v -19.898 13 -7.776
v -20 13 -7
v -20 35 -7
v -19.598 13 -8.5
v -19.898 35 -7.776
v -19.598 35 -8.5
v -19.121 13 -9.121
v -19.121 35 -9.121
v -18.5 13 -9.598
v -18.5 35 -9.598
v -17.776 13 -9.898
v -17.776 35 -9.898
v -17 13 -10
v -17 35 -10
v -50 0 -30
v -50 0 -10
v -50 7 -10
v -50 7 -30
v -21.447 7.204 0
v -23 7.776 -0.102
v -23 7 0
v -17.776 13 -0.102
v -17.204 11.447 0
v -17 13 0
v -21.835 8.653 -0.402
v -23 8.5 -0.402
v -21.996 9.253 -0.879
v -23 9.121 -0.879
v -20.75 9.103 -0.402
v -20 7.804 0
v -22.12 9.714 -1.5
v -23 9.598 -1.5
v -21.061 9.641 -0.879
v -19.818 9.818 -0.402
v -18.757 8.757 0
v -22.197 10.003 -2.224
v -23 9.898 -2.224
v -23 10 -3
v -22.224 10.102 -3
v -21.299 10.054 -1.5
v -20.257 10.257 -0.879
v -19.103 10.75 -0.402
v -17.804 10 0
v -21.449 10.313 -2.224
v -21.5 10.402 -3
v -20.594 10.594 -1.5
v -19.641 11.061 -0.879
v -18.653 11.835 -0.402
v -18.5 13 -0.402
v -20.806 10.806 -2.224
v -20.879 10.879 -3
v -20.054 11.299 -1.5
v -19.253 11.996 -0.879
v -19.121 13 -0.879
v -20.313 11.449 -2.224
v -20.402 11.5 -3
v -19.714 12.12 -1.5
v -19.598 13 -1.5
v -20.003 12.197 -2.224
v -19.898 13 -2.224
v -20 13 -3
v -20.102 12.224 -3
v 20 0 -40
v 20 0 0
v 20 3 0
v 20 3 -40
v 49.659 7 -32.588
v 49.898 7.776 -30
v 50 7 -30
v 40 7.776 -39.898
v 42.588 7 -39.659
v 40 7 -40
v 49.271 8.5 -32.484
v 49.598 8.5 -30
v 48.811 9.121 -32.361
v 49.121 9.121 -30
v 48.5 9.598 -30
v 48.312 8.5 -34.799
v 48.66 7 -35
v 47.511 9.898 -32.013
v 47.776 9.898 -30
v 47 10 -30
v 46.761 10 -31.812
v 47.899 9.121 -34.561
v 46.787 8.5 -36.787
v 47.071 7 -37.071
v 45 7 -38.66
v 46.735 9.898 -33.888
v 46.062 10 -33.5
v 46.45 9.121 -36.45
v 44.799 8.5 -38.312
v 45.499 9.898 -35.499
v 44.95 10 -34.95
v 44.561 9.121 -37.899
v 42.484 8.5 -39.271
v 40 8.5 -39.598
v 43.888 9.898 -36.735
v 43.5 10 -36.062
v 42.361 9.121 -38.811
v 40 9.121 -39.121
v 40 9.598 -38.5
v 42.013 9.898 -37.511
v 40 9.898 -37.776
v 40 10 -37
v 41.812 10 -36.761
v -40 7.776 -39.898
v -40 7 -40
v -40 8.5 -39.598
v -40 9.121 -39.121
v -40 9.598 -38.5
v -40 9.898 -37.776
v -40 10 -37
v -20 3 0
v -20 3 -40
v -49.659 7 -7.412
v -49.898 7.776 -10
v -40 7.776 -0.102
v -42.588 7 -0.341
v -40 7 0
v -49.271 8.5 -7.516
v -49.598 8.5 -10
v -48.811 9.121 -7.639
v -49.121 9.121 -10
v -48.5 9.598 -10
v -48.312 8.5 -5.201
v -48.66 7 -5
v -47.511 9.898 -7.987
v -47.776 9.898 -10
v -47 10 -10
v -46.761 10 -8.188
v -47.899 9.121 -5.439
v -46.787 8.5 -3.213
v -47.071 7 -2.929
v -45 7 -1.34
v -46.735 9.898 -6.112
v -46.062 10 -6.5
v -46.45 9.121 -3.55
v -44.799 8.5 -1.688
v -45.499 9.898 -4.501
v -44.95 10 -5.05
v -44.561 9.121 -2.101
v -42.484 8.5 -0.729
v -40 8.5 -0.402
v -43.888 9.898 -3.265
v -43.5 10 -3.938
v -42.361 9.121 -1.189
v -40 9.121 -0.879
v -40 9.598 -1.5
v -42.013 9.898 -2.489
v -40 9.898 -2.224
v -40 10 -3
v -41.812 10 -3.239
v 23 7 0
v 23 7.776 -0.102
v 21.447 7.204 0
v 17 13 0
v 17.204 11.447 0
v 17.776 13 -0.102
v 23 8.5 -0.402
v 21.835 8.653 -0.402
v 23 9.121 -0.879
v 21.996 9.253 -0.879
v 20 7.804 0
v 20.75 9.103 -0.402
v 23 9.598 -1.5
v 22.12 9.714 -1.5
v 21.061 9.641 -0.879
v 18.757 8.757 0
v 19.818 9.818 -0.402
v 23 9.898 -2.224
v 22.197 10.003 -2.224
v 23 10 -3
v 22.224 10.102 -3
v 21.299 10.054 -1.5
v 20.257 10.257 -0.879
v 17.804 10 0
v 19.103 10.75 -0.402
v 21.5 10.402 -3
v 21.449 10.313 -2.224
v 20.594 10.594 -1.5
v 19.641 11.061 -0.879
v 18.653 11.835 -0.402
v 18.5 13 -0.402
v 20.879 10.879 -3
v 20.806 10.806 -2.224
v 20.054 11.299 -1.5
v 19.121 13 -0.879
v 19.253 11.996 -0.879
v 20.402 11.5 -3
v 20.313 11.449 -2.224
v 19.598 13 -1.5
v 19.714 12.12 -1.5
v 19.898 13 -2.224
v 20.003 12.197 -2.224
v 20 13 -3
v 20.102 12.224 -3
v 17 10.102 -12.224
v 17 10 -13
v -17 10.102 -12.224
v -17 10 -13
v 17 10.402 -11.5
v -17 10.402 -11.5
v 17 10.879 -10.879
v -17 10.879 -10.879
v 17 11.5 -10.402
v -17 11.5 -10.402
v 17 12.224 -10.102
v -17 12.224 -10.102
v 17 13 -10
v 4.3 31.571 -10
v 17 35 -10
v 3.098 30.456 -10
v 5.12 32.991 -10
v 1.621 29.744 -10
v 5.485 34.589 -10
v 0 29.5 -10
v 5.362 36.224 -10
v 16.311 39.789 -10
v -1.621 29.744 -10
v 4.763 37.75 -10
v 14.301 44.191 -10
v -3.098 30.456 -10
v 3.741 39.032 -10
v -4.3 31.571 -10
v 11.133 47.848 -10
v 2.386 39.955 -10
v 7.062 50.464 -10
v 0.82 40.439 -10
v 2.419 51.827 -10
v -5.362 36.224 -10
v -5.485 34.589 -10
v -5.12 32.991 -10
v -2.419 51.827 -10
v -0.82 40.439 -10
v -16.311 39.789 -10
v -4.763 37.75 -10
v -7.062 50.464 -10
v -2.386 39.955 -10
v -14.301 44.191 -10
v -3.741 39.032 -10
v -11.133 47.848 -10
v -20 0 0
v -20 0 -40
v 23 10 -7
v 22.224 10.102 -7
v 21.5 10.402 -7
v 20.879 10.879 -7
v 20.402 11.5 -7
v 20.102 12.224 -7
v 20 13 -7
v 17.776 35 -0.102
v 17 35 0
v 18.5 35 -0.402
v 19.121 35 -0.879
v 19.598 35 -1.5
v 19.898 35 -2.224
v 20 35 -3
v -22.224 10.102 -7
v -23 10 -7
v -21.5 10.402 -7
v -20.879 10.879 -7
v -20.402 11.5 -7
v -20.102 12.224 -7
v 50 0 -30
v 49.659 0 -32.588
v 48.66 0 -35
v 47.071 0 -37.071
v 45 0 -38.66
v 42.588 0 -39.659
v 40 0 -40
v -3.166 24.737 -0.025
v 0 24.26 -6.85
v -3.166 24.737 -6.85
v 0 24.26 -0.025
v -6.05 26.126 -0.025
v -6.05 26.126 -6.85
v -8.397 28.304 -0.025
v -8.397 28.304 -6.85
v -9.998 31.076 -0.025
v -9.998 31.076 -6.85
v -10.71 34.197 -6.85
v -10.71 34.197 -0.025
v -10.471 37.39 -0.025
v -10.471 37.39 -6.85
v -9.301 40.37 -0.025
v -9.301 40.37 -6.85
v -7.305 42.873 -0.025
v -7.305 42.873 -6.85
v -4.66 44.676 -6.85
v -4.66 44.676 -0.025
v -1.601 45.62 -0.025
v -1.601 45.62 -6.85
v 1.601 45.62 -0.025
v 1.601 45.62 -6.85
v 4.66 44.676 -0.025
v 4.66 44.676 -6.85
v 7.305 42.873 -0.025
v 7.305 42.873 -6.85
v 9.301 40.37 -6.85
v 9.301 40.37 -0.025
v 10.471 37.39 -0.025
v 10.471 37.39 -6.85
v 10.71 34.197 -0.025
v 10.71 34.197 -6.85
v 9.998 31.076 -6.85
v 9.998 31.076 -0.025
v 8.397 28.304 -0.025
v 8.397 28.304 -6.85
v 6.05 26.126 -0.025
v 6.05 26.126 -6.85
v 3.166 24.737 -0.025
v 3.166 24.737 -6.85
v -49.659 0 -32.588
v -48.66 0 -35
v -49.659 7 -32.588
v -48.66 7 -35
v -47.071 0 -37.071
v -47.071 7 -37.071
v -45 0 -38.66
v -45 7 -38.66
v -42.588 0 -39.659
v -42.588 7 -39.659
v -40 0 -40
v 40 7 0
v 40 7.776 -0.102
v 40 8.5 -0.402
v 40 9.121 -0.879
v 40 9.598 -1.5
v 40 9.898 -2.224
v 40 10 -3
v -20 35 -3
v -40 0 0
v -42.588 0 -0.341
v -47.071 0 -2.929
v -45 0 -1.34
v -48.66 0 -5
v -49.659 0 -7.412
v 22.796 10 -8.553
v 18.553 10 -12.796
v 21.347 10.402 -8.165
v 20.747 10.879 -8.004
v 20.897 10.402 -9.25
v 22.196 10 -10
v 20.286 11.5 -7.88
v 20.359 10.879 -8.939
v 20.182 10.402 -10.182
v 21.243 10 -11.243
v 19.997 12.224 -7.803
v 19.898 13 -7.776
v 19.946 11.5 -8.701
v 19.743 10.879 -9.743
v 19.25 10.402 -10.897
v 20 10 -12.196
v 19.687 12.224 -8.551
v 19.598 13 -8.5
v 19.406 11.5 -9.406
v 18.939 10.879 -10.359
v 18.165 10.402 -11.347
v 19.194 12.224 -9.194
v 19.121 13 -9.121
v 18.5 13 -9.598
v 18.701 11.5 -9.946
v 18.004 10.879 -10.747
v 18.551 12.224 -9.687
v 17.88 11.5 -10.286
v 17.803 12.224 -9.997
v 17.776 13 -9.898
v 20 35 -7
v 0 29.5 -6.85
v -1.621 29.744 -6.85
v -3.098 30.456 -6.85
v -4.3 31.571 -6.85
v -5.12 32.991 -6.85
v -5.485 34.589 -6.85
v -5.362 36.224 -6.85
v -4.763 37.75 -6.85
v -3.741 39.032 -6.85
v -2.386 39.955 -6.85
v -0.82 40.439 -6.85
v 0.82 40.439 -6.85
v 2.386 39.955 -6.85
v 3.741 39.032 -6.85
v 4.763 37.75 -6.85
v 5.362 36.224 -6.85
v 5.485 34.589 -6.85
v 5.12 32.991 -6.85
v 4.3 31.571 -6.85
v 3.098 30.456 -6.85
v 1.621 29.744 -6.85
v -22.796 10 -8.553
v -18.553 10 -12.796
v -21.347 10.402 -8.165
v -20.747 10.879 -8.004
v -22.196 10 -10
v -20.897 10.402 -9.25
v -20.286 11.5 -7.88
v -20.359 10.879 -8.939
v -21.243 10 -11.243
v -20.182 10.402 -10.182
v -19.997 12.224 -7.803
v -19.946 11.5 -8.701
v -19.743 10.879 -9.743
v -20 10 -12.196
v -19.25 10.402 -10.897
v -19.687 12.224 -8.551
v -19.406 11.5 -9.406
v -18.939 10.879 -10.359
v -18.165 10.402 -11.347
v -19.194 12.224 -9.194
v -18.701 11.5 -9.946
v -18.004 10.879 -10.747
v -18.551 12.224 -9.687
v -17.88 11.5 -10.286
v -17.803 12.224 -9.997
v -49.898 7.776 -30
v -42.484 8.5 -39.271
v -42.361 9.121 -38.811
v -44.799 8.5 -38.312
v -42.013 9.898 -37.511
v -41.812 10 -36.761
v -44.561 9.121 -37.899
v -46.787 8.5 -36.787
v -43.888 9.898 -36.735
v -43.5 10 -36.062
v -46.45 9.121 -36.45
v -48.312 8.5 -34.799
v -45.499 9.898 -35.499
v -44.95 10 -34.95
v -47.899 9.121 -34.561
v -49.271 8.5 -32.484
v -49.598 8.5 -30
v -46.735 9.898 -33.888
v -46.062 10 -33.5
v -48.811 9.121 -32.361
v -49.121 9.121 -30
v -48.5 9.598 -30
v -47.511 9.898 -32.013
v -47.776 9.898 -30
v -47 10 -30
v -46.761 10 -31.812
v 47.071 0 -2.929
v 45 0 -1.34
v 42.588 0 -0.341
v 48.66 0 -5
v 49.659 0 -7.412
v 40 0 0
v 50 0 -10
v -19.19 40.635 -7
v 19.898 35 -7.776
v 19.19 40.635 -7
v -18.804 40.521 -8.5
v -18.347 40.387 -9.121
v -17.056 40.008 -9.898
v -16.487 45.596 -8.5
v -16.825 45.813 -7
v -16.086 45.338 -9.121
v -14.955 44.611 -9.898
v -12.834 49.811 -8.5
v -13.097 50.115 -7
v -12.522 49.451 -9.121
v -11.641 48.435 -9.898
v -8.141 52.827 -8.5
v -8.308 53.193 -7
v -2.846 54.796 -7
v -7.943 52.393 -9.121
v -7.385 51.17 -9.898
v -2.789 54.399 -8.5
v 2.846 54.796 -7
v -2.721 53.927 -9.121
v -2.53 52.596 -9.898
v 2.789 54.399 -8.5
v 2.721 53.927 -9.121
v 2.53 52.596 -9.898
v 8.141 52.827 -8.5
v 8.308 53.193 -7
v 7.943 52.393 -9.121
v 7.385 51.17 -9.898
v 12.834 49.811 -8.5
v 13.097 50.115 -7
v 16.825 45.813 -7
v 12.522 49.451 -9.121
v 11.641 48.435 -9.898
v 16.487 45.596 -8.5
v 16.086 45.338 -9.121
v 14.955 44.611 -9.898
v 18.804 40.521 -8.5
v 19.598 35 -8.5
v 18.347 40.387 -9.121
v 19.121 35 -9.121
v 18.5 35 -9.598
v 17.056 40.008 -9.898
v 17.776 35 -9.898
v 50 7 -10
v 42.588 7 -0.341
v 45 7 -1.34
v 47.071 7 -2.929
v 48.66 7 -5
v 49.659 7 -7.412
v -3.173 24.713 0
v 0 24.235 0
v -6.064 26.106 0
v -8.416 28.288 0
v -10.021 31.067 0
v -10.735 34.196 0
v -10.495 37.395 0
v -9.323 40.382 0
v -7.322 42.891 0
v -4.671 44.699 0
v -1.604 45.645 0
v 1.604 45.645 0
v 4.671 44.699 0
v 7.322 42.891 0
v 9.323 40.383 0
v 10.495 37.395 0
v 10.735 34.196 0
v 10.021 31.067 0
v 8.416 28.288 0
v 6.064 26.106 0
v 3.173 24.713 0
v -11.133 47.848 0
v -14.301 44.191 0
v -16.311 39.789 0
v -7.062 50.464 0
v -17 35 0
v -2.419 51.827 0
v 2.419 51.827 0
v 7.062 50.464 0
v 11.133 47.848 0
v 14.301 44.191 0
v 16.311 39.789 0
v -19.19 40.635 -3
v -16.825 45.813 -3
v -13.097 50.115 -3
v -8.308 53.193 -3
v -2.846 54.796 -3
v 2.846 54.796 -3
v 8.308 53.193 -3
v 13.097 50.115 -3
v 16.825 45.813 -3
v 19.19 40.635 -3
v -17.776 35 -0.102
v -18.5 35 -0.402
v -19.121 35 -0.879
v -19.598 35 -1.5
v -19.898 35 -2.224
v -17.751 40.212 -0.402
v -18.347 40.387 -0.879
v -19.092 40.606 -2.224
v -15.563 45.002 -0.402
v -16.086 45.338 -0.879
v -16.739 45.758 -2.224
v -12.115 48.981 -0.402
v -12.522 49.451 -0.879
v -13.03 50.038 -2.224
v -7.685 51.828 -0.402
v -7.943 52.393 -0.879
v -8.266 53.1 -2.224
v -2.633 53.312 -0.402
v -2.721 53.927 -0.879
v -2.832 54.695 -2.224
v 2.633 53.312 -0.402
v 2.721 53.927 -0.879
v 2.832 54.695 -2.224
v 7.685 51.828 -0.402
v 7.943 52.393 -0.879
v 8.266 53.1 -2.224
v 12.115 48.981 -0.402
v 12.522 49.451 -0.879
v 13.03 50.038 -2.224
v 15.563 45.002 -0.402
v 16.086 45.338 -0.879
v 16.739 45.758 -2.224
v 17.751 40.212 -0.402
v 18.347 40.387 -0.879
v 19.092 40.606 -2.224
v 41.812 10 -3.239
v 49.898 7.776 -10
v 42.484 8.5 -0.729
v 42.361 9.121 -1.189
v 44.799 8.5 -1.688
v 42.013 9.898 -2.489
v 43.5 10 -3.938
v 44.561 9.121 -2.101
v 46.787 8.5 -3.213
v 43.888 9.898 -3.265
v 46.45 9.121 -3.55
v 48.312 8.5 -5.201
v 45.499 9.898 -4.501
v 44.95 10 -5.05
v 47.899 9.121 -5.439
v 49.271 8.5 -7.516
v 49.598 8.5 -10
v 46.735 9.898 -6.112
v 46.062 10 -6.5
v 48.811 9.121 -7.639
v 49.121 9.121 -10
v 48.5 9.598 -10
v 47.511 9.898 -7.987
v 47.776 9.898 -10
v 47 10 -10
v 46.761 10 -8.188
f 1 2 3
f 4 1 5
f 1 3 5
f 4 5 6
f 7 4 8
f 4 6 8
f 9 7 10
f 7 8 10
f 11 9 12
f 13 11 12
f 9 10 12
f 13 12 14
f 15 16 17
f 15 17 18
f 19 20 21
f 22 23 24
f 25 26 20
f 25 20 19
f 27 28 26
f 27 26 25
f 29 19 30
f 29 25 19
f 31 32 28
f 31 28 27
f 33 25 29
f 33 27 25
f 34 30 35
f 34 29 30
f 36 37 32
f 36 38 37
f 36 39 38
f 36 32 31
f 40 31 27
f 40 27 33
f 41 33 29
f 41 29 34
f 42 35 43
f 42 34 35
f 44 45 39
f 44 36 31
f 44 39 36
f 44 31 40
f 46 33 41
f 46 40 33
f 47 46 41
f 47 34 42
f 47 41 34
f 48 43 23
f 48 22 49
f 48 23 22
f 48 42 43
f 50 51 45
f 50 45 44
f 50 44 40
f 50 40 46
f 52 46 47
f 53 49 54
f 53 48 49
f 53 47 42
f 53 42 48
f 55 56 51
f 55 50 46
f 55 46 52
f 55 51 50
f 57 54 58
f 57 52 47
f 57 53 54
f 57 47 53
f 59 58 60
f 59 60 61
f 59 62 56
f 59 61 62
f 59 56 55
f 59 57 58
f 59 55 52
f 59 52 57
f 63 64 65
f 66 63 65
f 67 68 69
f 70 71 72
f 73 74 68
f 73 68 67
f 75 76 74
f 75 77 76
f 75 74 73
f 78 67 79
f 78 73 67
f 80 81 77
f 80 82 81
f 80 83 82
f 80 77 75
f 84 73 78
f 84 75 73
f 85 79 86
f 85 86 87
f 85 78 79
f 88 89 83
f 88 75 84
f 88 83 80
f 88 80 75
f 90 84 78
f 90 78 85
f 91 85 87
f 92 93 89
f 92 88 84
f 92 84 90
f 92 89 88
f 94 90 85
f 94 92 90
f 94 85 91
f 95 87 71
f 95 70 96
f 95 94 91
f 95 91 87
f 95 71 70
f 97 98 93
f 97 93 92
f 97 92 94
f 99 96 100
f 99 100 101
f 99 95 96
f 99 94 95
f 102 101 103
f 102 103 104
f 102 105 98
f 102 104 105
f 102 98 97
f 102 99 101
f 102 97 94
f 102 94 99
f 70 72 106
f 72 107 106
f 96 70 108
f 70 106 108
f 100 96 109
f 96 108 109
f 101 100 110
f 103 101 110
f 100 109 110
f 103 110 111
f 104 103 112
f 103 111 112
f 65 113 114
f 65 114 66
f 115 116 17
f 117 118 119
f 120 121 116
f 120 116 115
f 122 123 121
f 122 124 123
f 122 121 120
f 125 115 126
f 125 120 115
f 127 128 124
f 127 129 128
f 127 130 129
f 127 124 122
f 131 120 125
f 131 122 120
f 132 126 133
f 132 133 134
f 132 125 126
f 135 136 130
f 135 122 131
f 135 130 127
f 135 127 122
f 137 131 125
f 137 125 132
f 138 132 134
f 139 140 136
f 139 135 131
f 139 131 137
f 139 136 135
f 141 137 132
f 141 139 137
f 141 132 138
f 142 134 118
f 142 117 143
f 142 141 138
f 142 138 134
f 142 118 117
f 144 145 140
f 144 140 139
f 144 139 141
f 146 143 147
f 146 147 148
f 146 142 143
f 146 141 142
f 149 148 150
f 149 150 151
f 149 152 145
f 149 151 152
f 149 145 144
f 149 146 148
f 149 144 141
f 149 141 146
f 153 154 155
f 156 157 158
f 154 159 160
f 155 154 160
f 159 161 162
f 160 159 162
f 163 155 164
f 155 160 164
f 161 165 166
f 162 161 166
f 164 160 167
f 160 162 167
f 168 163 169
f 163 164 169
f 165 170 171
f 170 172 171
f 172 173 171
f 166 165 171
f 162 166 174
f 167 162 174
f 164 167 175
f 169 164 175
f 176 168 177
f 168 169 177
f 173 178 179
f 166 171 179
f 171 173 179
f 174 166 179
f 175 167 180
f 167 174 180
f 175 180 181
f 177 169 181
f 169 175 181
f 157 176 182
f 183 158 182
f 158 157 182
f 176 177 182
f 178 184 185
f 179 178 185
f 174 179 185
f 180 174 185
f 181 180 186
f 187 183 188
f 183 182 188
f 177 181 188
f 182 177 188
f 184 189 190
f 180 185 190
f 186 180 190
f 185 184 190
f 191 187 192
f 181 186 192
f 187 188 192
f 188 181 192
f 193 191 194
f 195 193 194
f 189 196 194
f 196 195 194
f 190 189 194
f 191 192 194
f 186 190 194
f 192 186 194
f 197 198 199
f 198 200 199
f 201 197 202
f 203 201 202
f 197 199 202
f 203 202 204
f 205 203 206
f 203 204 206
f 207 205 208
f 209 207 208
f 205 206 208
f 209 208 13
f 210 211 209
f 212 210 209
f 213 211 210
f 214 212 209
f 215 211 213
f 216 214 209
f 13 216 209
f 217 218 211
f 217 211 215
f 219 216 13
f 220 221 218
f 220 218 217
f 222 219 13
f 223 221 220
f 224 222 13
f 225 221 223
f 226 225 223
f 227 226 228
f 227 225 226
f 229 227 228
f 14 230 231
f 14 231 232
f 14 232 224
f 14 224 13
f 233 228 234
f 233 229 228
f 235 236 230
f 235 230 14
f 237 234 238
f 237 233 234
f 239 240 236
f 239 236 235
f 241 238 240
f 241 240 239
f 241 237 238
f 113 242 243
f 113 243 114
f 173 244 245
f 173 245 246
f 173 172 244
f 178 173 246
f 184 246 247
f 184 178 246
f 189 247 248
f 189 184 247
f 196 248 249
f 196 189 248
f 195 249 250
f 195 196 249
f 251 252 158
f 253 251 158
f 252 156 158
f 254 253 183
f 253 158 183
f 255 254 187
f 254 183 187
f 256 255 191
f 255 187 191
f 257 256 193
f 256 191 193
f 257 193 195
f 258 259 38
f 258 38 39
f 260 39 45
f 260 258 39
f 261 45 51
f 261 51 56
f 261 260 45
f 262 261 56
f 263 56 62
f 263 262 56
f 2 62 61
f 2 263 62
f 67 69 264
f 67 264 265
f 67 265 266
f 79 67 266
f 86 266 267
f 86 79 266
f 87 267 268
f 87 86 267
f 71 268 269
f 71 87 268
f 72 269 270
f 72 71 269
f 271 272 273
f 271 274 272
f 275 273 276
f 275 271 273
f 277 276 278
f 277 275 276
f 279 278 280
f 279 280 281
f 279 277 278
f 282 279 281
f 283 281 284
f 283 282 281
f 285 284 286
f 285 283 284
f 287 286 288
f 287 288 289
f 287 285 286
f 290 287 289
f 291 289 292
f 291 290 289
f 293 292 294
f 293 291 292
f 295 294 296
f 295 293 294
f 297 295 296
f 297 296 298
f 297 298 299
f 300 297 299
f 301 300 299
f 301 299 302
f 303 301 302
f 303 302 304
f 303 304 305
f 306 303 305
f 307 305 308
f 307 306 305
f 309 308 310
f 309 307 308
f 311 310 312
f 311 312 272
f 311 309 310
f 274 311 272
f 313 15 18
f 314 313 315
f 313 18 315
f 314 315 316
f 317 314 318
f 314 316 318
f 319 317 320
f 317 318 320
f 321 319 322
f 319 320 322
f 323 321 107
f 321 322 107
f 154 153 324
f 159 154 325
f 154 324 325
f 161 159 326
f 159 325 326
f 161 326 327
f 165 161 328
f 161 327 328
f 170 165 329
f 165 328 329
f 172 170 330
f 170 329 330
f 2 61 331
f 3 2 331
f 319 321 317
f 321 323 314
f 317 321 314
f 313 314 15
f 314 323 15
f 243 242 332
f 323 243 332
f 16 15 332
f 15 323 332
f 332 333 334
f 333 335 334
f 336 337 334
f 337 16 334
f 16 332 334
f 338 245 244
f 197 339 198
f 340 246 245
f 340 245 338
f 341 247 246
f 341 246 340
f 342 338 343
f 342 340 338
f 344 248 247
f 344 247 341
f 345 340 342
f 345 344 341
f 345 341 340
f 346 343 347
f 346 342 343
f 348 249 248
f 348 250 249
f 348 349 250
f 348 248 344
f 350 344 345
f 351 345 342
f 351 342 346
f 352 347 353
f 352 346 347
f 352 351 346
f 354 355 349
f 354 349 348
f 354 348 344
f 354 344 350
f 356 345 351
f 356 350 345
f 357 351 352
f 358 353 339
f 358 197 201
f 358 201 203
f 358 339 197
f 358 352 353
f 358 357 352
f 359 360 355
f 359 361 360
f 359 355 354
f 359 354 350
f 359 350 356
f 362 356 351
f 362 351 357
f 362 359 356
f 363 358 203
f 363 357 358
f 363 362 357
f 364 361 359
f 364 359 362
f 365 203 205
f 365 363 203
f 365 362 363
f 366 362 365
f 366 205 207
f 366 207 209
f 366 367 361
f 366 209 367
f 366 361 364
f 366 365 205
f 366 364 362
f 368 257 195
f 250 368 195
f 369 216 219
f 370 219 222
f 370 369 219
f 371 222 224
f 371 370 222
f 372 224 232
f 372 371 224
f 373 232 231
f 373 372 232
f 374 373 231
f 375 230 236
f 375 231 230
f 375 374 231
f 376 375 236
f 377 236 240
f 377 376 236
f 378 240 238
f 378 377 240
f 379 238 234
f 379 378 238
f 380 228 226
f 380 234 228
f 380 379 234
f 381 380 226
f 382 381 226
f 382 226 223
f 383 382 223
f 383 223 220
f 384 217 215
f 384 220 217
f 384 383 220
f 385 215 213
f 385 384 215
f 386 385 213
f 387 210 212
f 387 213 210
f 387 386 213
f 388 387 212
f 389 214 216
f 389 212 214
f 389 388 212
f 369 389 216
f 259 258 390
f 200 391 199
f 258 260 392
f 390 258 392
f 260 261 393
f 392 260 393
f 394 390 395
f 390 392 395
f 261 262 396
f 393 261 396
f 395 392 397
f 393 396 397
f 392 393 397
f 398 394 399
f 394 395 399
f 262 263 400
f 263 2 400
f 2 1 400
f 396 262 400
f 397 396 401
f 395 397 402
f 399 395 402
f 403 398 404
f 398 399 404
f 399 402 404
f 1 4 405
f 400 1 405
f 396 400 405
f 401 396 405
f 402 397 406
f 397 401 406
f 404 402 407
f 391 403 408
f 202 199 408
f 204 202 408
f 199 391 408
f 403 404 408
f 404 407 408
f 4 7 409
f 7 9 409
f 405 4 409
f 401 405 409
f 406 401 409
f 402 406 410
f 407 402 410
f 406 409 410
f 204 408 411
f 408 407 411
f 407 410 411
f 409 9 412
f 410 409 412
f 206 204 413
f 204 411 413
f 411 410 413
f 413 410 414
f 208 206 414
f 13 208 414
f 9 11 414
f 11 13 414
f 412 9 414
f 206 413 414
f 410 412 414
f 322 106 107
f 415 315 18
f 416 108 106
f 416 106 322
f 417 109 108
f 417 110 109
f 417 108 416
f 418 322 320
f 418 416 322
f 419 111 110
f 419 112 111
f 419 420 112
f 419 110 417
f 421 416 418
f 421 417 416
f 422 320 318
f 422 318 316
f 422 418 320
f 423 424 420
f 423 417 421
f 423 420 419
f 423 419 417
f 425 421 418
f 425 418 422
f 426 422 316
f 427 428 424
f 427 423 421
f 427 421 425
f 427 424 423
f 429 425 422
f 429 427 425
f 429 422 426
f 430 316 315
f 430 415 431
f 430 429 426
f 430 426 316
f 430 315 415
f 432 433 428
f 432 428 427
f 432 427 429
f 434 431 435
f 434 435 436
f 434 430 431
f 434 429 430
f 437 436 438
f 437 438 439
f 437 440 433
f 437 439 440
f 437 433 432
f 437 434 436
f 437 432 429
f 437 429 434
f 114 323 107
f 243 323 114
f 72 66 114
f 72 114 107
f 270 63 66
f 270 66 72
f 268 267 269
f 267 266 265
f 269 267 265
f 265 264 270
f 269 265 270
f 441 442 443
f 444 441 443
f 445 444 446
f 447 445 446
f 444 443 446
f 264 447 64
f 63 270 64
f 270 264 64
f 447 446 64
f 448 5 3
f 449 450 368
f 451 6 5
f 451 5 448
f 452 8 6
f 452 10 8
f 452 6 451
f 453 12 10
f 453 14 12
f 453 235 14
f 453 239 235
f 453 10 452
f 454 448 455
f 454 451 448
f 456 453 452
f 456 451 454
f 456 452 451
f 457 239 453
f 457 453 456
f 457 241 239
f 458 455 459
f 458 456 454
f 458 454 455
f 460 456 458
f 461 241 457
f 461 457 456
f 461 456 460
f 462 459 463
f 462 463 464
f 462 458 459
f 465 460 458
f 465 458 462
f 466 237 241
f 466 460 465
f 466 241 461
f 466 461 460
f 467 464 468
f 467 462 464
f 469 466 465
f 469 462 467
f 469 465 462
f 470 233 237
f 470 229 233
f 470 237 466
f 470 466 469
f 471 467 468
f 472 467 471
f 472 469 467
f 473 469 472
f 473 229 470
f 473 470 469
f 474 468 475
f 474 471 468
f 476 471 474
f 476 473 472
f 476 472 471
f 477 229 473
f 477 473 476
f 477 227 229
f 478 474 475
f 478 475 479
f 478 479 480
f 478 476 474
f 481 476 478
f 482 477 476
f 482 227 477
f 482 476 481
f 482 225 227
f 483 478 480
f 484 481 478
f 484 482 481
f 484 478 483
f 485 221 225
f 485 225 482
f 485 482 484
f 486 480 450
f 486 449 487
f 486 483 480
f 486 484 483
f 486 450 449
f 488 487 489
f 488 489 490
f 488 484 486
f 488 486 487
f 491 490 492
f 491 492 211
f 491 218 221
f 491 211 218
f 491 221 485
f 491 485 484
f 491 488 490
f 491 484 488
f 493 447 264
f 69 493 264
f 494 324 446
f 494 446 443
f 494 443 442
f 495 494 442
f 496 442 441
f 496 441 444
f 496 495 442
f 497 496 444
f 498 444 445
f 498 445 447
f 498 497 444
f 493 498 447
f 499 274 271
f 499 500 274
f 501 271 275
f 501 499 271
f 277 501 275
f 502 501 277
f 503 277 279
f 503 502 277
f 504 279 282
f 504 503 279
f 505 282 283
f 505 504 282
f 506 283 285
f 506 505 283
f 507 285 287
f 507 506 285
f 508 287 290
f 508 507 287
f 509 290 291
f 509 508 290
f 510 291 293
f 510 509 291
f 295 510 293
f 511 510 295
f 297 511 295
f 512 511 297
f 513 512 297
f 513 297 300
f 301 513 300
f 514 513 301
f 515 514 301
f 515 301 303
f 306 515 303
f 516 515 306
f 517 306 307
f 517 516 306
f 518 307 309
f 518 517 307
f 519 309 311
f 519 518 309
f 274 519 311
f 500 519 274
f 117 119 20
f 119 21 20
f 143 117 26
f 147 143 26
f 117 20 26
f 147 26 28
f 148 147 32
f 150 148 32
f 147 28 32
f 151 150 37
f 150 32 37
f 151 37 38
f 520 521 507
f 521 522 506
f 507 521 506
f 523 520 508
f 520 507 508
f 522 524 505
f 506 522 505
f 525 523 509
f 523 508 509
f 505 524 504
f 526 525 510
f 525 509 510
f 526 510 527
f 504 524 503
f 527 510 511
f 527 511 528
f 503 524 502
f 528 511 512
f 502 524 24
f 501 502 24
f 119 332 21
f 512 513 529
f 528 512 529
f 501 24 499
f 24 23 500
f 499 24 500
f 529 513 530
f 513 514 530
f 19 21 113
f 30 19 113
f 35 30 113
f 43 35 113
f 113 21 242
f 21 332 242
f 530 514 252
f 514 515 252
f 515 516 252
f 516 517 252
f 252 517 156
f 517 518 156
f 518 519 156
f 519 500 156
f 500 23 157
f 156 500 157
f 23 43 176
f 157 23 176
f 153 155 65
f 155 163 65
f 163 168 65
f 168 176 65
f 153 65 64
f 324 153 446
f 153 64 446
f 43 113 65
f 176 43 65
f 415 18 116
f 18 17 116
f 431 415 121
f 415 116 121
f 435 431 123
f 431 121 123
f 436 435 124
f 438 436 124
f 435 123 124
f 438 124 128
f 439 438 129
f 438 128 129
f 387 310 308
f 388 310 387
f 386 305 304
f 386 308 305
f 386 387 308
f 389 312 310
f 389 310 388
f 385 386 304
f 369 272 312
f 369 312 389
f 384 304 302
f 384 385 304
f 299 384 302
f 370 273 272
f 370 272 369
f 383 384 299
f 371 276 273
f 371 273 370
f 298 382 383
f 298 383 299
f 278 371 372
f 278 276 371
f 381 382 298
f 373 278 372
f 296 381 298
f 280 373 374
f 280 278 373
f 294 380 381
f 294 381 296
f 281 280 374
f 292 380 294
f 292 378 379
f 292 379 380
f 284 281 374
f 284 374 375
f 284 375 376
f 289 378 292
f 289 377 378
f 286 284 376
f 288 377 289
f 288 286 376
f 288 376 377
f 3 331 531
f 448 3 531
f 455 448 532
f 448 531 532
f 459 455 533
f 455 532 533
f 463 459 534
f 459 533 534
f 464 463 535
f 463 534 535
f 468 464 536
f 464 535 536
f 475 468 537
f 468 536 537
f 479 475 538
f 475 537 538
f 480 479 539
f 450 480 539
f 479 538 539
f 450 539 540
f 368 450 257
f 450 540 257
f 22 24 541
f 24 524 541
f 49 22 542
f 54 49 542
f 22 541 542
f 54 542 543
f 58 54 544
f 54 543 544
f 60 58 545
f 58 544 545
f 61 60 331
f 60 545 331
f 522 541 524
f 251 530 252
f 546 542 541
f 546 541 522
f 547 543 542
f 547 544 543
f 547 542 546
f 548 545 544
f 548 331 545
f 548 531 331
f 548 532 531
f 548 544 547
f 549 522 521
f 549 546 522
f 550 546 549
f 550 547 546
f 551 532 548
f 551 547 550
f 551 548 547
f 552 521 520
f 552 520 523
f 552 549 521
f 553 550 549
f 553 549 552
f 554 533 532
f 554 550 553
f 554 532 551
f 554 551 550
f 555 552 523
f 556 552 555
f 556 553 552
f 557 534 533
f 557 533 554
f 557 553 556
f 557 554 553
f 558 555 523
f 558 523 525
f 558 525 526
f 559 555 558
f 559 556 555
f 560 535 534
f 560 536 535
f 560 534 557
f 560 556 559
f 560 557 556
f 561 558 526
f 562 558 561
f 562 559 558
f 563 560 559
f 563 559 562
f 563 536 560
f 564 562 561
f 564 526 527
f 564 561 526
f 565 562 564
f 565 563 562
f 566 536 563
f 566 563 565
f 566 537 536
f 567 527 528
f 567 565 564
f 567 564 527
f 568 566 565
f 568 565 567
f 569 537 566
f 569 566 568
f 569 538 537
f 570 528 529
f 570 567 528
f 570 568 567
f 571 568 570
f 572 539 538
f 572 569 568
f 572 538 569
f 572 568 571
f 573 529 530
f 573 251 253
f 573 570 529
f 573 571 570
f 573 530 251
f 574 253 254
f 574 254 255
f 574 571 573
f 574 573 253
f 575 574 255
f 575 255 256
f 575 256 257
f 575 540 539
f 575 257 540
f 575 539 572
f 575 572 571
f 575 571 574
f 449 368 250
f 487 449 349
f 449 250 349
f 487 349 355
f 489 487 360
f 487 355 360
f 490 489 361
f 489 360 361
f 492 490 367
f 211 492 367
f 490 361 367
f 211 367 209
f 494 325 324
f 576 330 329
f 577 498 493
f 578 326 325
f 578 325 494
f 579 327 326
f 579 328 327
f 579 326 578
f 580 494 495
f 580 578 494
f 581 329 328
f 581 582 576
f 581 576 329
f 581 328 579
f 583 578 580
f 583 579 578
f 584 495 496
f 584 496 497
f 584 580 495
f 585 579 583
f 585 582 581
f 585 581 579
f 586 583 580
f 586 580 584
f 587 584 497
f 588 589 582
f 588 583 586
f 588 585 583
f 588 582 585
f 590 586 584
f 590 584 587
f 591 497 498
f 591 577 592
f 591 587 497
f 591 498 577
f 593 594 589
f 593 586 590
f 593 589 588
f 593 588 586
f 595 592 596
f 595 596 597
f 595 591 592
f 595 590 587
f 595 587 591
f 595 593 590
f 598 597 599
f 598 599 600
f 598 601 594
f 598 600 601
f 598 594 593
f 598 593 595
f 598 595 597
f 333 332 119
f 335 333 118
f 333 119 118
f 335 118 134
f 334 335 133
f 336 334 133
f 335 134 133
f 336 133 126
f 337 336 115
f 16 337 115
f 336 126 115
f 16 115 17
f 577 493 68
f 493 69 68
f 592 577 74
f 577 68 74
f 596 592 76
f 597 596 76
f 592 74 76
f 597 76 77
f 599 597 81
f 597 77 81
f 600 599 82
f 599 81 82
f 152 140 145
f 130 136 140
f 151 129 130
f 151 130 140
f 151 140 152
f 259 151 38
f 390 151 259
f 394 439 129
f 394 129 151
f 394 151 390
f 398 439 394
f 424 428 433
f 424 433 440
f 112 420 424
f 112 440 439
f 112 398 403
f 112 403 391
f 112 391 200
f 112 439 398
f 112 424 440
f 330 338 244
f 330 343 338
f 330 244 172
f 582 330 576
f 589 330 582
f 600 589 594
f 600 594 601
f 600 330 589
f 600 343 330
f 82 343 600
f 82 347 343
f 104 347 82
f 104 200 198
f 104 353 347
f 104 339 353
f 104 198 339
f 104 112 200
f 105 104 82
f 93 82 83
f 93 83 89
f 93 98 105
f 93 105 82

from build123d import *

# Parameters (mm, degrees)
SKETCH3_W           = 100
SKETCH3_H           = 40
BOSS_EXTRUDE1_DEPTH = 10
BOSS_EXTRUDE2_DEPTH = 10
SKETCH5_W           = 40
SKETCH5_H           = 3
CUT_EXTRUDE1_DEPTH  = 85.409715081
FILLET1_R           = 10
FILLET2_R           = 3


with BuildPart() as part:
    # Sketch3 → Boss-Extrude1 (new body)
    with BuildSketch(Plane(origin=(0, 0, 0), x_dir=(1, 0, 0), z_dir=(0, 1, 0))):
        with Locations((0, 20)):
            Rectangle(SKETCH3_W, SKETCH3_H)
    extrude(amount=BOSS_EXTRUDE1_DEPTH)

    # Sketch4 → Boss-Extrude2 (add)
    with BuildSketch(Plane.XY):
        with BuildLine():
            Line((-20, 0), (-20, 35))
            ThreePointArc((-20, 35), (0, 55), (20, 35))
            Line((20, 35), (20, 0))
            Line((20, 0), (-20, 0))
        make_face()
    extrude(amount=-BOSS_EXTRUDE2_DEPTH)

    # Sketch5 → Cut-Extrude1 (cut, through all)
    with BuildSketch(Plane.XY):
        with Locations((0, 1.5)):
            Rectangle(SKETCH5_W, SKETCH5_H)
    extrude(amount=-CUT_EXTRUDE1_DEPTH, mode=Mode.SUBTRACT)

    # Sketch6 → CBORE for M10 Hex Head Bolt1 (revolve, cut)
    with BuildSketch(Plane(origin=(0, 35, 0), x_dir=(0, -1, 0), z_dir=(1, 0, 0))):
        Polygon((0, 0), (0, 40), (5.5, 40), (5.5, 6.85), (10.74, 6.85), (10.74, 0.025), (10.765, 0), align=None)
    revolve(axis=Axis((0, 35, 6.35), (0, 0, -1)), mode=Mode.SUBTRACT)

    # Fillet1
    fillet1_edges = [part.edges().sort_by_distance(p)[0] for p in [
        (-50, 5, -40),
        (50, 5, -40),
        (50, 5, 0),
        (-50, 5, 0),
    ]]
    fillet(fillet1_edges, radius=FILLET1_R)

    # Fillet2
    fillet2_edges = [part.edges().sort_by_distance(p)[0] for p in [
        (30, 10, 0),
        (-20, 22.5, -10),
        (20, 22.5, -10),
        (-20, 22.5, 0),
        (20, 22.5, 0),
        (0, 55, 0),
        (-20, 10, -5),
        (0, 55, -10),
        (20, 10, -5),
        (0, 10, -10),
        (0, 10, -40),
        (50, 10, -20),
        (-30, 10, 0),
        (-50, 10, -20),
        (-47.071067812, 10, -37.071067812),
        (-47.071067812, 10, -2.928932188),
        (47.071067812, 10, -2.928932188),
        (47.071067812, 10, -37.071067812),
    ]]
    fillet(fillet2_edges, radius=FILLET2_R)


solid = part.part
